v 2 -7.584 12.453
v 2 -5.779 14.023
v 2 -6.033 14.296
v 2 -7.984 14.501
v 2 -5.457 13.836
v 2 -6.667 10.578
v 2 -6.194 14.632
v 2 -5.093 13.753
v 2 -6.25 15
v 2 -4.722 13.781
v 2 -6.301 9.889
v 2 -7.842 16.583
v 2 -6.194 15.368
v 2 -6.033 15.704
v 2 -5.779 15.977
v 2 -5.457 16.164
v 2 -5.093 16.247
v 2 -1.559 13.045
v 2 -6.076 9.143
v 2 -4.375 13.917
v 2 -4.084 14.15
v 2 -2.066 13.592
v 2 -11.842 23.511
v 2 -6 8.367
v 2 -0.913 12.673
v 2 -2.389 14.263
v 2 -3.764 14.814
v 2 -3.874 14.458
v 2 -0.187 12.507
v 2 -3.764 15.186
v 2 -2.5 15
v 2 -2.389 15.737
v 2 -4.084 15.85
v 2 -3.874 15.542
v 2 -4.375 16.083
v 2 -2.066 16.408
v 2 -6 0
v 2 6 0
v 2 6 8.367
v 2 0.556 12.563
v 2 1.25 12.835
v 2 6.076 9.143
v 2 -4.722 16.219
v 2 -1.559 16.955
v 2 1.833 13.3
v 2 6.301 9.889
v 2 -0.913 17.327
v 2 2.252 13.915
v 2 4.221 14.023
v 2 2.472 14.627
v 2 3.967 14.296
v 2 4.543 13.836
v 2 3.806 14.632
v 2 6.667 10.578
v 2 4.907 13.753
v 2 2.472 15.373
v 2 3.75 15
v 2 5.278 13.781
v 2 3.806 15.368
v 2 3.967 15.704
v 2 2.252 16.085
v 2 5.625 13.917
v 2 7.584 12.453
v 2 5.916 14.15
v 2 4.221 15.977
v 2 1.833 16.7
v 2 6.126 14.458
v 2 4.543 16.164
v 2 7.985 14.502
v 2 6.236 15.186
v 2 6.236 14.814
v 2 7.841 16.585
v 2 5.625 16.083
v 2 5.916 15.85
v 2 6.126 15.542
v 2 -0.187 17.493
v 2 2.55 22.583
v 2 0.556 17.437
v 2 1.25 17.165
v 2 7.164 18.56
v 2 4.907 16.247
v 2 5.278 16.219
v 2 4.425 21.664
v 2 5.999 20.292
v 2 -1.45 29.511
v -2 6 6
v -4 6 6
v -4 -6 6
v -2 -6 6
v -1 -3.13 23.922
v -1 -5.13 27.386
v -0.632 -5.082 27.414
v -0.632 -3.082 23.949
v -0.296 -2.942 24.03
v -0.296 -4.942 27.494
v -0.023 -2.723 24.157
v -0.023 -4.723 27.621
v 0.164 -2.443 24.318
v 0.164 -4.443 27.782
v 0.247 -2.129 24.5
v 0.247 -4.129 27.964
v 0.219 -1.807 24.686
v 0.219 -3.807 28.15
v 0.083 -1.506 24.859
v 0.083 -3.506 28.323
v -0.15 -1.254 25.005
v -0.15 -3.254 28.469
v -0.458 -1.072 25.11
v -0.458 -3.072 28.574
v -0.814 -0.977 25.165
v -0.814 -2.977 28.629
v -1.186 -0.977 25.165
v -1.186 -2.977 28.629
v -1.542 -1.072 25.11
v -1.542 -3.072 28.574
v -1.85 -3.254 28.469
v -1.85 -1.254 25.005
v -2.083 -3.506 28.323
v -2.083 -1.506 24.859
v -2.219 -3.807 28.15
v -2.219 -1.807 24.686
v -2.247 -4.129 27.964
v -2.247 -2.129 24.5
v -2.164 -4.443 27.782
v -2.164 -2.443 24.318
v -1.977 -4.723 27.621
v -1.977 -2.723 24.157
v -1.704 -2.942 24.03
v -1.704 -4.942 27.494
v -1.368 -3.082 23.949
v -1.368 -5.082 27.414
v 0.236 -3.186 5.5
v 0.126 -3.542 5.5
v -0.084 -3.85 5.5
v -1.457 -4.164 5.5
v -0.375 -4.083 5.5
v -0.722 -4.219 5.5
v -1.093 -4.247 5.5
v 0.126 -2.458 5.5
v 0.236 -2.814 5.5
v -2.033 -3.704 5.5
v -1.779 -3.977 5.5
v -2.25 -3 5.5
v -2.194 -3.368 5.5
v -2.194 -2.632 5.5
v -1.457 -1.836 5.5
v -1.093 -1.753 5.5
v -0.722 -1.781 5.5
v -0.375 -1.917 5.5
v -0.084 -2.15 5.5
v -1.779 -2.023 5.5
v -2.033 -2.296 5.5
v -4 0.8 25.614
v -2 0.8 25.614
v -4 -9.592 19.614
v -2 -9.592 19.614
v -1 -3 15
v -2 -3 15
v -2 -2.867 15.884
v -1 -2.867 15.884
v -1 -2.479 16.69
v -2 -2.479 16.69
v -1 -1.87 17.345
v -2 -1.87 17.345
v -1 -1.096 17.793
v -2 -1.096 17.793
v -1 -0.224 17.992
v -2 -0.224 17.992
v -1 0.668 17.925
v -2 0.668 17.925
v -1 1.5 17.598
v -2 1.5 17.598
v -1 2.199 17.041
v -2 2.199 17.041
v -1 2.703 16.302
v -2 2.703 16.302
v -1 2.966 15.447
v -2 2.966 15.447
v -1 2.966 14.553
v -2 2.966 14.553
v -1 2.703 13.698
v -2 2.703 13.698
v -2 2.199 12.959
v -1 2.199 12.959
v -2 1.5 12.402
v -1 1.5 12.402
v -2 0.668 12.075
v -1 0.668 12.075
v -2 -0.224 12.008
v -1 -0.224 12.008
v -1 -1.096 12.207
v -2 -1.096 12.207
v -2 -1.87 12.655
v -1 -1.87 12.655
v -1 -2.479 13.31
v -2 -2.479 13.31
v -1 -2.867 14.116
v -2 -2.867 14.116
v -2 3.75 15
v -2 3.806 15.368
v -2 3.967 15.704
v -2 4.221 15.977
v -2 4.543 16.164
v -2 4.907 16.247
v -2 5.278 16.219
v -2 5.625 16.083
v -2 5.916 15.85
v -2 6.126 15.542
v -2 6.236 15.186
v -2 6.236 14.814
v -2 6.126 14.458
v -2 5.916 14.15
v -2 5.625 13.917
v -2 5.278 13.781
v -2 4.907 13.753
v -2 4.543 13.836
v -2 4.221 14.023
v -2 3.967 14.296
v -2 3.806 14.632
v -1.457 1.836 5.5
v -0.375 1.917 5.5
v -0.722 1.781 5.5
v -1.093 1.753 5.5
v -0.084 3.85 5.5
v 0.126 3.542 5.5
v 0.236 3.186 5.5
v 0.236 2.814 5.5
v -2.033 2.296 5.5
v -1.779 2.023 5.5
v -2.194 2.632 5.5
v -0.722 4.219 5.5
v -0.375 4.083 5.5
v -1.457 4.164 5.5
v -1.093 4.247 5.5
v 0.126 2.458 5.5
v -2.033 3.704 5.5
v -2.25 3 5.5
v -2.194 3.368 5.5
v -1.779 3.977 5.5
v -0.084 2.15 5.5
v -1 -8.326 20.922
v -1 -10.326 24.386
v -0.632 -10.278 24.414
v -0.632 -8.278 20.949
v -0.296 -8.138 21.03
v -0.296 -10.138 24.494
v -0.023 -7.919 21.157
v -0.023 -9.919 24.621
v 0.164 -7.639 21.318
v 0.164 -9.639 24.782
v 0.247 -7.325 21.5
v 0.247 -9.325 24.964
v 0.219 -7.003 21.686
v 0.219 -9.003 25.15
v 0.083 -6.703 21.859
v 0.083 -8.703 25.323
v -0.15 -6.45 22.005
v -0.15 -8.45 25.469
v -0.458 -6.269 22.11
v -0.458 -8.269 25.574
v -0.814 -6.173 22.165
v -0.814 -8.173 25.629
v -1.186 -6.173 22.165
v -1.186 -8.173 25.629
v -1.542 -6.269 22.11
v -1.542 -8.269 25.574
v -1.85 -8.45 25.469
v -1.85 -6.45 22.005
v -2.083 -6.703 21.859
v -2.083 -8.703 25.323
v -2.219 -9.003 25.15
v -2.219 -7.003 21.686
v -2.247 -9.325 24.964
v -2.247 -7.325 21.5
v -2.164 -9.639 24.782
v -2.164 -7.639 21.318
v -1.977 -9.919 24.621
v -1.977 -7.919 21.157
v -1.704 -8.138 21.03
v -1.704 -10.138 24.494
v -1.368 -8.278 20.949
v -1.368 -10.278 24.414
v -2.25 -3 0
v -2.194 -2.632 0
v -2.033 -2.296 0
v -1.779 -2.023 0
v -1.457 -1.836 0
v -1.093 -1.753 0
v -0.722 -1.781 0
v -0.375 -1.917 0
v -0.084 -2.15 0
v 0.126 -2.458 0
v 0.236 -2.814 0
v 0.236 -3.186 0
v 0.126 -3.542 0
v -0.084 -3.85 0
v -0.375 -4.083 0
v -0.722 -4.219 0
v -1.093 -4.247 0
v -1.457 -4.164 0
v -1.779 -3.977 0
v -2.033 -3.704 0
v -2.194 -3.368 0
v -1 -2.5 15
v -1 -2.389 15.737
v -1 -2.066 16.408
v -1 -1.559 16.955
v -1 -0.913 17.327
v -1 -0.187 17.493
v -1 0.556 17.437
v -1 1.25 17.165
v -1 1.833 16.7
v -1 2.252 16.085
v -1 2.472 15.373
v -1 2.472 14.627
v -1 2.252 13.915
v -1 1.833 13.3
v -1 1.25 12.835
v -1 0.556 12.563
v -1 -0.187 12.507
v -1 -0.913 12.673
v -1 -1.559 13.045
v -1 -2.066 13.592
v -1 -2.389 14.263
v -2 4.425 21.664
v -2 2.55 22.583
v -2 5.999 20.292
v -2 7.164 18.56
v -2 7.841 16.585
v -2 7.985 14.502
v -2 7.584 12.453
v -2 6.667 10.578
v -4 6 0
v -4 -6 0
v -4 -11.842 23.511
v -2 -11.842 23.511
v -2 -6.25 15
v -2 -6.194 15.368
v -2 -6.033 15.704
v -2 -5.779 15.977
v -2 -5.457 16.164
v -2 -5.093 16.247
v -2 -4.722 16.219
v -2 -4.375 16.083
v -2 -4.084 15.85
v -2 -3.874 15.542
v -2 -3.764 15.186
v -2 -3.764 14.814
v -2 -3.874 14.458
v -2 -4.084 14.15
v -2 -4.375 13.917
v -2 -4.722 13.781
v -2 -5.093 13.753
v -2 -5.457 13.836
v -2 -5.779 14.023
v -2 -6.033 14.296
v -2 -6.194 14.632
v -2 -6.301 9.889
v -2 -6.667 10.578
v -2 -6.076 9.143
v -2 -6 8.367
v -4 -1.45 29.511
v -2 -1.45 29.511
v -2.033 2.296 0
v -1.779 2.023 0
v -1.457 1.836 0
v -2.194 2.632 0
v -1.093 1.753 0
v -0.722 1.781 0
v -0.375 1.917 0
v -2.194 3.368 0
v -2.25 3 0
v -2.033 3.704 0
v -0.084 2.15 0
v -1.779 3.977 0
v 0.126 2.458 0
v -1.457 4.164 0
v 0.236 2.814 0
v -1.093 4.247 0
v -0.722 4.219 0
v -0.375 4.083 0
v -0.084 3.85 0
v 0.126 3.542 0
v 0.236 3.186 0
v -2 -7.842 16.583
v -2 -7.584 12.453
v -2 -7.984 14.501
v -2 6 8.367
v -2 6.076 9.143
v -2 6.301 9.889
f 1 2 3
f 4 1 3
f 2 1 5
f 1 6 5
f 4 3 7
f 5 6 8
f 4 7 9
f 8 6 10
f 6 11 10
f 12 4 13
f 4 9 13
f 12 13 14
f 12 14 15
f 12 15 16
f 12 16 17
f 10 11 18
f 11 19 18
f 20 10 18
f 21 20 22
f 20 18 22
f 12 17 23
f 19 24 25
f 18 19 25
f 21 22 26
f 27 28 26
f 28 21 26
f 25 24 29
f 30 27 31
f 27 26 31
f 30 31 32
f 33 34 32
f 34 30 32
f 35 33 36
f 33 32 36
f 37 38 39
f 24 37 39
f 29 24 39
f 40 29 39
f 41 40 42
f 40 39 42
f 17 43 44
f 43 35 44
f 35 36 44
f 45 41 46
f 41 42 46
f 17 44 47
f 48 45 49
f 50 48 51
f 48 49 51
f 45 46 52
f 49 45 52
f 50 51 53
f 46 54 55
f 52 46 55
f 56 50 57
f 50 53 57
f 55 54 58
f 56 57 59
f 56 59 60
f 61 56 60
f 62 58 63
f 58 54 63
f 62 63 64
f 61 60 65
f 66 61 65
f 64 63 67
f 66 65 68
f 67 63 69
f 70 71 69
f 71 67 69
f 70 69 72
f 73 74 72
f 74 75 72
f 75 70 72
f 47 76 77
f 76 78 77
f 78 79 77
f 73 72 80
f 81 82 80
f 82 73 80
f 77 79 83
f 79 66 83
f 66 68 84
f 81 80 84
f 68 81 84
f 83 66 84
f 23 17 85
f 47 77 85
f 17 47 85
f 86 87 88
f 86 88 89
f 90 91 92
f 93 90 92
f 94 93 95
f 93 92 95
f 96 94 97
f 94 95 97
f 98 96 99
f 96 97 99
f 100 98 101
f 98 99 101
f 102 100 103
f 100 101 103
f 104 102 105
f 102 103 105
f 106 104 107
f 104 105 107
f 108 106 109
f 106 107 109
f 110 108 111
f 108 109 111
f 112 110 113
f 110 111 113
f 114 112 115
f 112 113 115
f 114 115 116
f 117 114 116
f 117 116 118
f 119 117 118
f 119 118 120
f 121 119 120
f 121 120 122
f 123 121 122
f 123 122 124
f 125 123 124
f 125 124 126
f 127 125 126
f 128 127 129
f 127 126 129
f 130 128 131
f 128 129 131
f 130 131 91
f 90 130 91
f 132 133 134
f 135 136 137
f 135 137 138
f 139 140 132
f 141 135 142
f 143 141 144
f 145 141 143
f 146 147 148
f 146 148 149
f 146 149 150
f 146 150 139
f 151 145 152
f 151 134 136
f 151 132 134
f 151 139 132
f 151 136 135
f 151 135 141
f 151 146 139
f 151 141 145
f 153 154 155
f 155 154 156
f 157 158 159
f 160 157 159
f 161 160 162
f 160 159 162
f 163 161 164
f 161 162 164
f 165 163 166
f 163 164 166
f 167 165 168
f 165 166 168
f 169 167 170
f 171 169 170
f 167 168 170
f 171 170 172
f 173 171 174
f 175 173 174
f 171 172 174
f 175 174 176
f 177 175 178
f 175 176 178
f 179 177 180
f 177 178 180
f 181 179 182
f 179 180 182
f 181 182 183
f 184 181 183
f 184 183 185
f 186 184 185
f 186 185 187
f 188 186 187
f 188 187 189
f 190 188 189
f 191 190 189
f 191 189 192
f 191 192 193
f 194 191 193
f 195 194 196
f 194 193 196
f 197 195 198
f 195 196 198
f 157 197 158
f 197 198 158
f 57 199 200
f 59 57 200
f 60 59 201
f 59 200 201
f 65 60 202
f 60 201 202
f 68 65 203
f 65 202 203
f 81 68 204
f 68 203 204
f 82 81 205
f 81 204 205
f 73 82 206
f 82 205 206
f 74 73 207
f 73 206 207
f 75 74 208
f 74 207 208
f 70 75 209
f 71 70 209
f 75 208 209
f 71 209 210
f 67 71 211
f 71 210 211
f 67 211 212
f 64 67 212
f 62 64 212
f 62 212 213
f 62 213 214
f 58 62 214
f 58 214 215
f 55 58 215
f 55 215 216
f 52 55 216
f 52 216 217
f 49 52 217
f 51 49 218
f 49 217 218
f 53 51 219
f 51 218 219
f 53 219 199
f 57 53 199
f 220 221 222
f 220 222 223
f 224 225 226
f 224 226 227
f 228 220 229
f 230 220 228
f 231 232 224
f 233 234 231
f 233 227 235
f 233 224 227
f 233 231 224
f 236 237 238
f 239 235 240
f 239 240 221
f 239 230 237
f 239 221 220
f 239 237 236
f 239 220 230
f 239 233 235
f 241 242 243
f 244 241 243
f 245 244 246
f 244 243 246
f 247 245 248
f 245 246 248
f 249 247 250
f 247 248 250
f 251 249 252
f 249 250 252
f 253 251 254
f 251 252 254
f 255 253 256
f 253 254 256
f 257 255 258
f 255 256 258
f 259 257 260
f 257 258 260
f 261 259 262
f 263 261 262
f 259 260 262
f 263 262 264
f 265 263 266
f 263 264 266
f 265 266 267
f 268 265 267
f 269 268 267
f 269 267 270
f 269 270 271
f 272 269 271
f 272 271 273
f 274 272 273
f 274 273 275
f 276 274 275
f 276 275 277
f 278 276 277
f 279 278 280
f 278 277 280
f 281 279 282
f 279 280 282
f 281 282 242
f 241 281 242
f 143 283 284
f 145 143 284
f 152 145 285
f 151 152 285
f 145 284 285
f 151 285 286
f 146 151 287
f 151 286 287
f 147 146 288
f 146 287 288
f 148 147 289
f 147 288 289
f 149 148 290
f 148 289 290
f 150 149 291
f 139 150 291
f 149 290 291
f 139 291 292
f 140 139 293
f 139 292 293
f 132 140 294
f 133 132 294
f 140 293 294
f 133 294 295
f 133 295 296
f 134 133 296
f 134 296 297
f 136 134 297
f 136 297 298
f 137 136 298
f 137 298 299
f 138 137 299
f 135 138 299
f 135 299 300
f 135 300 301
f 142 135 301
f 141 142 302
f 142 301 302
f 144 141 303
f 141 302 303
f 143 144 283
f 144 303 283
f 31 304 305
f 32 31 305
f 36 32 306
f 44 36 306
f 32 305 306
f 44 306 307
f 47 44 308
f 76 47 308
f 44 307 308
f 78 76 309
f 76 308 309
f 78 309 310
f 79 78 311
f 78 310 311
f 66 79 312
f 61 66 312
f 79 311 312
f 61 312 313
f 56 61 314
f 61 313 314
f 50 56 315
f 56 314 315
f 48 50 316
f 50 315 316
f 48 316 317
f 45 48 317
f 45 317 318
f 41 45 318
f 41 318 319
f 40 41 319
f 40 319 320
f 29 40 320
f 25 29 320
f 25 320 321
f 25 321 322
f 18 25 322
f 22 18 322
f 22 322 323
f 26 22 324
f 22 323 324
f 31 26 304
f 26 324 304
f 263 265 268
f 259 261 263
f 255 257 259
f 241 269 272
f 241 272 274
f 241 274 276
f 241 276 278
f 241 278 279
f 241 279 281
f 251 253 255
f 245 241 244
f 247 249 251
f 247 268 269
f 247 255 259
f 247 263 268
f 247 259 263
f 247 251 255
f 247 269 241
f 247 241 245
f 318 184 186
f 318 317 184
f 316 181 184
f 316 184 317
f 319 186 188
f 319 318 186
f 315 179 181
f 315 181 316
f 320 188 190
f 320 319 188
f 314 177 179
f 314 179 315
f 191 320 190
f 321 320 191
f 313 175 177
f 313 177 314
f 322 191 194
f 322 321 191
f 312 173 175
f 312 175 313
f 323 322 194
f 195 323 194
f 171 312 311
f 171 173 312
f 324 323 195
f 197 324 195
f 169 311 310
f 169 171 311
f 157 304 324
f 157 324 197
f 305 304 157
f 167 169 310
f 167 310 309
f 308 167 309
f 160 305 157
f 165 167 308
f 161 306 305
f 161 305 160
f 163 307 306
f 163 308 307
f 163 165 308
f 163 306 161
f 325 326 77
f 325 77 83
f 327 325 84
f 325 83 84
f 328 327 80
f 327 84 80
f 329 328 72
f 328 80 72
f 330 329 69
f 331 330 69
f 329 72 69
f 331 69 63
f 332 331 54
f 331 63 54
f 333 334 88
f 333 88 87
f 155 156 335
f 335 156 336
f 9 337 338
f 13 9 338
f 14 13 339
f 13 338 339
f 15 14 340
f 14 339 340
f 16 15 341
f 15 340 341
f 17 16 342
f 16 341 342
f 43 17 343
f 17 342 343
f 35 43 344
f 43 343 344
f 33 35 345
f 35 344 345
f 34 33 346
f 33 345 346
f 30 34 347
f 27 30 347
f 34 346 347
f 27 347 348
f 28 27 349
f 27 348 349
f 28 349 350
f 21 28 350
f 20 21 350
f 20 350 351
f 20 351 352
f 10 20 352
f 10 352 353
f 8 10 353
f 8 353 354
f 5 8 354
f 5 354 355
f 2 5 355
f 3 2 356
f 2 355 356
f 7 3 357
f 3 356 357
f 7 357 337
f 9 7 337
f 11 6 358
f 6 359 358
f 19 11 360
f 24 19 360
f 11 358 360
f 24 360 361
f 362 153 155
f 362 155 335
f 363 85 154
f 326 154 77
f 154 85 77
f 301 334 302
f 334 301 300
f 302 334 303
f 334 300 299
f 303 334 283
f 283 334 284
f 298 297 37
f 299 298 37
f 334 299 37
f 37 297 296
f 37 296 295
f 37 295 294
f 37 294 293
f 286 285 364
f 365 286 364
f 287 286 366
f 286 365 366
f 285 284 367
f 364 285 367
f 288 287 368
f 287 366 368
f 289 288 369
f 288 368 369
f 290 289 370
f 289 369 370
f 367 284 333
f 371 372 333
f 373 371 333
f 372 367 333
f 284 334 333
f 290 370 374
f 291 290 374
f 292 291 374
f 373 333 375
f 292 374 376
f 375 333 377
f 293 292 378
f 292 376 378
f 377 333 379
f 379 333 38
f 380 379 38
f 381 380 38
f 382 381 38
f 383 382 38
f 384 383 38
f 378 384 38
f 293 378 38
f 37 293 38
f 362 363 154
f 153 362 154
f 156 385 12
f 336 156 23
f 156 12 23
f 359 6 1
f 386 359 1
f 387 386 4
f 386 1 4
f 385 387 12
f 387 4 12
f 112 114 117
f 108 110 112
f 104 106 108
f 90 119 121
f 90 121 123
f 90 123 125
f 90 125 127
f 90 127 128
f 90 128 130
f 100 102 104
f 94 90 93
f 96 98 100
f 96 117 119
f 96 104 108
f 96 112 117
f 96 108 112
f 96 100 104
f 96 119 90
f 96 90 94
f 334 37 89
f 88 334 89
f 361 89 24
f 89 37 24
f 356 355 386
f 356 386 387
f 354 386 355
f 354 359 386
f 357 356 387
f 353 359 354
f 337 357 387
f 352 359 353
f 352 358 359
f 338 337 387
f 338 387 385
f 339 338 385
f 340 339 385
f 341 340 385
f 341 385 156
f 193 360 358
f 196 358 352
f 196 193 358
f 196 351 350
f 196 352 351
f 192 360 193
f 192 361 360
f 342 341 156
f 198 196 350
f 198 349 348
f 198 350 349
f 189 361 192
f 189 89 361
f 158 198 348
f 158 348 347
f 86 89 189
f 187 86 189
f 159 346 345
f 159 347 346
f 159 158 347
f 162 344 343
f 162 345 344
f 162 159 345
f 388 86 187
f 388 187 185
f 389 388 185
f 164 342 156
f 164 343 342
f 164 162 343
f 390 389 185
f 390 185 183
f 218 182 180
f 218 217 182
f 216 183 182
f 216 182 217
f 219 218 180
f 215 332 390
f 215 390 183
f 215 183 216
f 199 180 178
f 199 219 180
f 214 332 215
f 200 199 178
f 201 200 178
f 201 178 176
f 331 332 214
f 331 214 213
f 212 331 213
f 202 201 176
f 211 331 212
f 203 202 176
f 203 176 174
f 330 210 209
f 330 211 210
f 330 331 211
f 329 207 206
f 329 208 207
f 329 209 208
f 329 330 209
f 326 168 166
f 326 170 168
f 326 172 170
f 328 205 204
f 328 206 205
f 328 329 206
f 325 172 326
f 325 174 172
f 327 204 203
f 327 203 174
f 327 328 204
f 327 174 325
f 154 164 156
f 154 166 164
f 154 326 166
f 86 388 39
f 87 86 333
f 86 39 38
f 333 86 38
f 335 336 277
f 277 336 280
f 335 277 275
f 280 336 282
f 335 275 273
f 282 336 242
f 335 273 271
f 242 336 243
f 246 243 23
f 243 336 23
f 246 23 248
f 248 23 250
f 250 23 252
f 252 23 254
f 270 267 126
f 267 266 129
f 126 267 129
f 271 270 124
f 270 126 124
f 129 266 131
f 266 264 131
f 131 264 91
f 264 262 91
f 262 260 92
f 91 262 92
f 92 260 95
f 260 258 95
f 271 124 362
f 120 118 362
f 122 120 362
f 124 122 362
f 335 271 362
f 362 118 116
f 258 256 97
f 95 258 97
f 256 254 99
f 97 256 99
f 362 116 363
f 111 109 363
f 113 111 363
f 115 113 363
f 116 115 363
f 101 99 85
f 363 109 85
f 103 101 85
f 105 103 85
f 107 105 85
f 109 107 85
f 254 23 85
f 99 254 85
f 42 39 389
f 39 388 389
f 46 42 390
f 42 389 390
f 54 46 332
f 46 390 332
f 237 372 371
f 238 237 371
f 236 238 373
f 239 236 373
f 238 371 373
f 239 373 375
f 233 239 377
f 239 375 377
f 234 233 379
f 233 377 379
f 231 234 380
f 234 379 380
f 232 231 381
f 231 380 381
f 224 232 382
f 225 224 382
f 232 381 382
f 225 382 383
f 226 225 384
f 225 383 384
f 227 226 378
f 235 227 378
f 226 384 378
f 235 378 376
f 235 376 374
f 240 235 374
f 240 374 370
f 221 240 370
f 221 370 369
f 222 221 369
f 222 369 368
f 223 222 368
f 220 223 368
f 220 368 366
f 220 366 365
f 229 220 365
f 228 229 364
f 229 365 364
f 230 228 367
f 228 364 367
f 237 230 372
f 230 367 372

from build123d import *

# Parameters (mm, degrees)
SKETCH1_W       = 6
SKETCH1_H       = 12
EXTRUDE1_DEPTH  = 6
SKETCH3_W       = 4
SKETCH3_H       = 8.6
EXTRUDE2_DEPTH  = 1
SKETCH2_R       = 1.25
EXTRUDE3_DEPTH  = 5.5
EXTRUDE4_DEPTH  = 4
SKETCH6_R       = 3
EXTRUDE5_DEPTH  = 1
SKETCH7_R       = 1.25
EXTRUDE6_DEPTH  = 4
SKETCH8_R       = 2.5
EXTRUDE7_DEPTH  = 3
FILLET1_R       = 4
EXTRUDE9_START  = -4
EXTRUDE9_DEPTH  = 4
EXTRUDE10_DEPTH = 2
SKETCH14_R      = 1.25
EXTRUDE11_DEPTH = 4


with BuildPart() as part:
    # Sketch1 → Extrude1 (new body)
    with BuildSketch(Plane.XY):
        with Locations((-1, 0)):
            Rectangle(SKETCH1_W, SKETCH1_H)
    extrude(amount=EXTRUDE1_DEPTH)

    # Sketch3 → Extrude2 (add)
    with BuildSketch(Plane.XY.offset(6)):
        Rectangle(SKETCH3_W, SKETCH3_H)
    extrude(amount=EXTRUDE2_DEPTH)

    # Sketch2 → Extrude3 (cut)
    with BuildSketch(Plane(origin=(0, 0, 0), x_dir=(-1, 0, 0), z_dir=(0, 0, -1))):
        with Locations((1, 3)):
            Circle(SKETCH2_R)
        with Locations((1, -3)):
            Circle(SKETCH2_R)
    extrude(amount=-EXTRUDE3_DEPTH, mode=Mode.SUBTRACT)

    # Sketch4 → Extrude4 (add)
    with BuildSketch(Plane(origin=(2, 0, 0), x_dir=(0, 0, -1), z_dir=(1, 0, 0))):
        with BuildLine():
            Line((-9.708497378, 6), (-6, 6))
            Line((-6, 6), (-6, -6))
            Line((-6, -6), (-9.708497378, -6))
            ThreePointArc((-9.708497378, -6), (-23, 0), (-9.708497378, 6))
        make_face()
    extrude(amount=-EXTRUDE4_DEPTH)

    # Sketch6 → Extrude5 (cut)
    with BuildSketch(Plane.ZY.offset(2)):
        with Locations(Location((15, 0, 0), (0, 0, 270))):
            Circle(SKETCH6_R)
    extrude(amount=-EXTRUDE5_DEPTH, mode=Mode.SUBTRACT)

    # Sketch7 → Extrude6 (cut)
    with BuildSketch(Plane.ZY.offset(2)):
        with Locations(Location((15, -5, 0), (0, 0, 270))):
            Circle(SKETCH7_R)
        with Locations(Location((15, 5, 0), (0, 0, 270))):
            Circle(SKETCH7_R)
    extrude(amount=-EXTRUDE6_DEPTH, mode=Mode.SUBTRACT)

    # Sketch8 → Extrude7 (cut)
    with BuildSketch(Plane.ZY.offset(1)):
        with Locations(Location((15, 0, 0), (0, 0, 270))):
            Circle(SKETCH8_R)
    extrude(amount=-EXTRUDE7_DEPTH, mode=Mode.SUBTRACT)

    # Fillet1
    fillet1_edges = [part.edges().sort_by_distance(p)[0] for p in [
        (0, -6, 9.708497378),
        (0, 6, 9.708497378),
    ]]
    fillet(fillet1_edges, radius=FILLET1_R)

    # Sketch12 → Extrude9 (add)
    with BuildSketch(Plane.ZY.offset(2).offset(EXTRUDE9_START)):
        with BuildLine():
            Line((16.582575695, -7.841903734), (23.510778925, -11.841903734))
            Line((23.510778925, -11.841903734), (29.510778925, -1.449598888))
            Line((29.510778925, -1.449598888), (22.582575695, 2.550401112))
            ThreePointArc((22.582575695, 2.550401112), (21.92820323, -4), (16.582575695, -7.841903734))
        make_face()
    extrude(amount=EXTRUDE9_DEPTH)

    # Sketch13 → Extrude10 (add)
    with BuildSketch(Plane.ZY.offset(2)):
        Polygon((29.510778925, -1.449598888), (25.613664608, 0.800401112), (19.613664608, -9.591903734), (23.510778925, -11.841903734), align=None)
    extrude(amount=EXTRUDE10_DEPTH)

    # Sketch14 → Extrude11 (cut)
    with BuildSketch(Plane(origin=(0, -13.140941839, 22.760778925), x_dir=(1, 0, 0), z_dir=(0, -0.5000000000000007, 0.8660254037844383))):
        with Locations(Location((-1, 4.5, 0), (0, 0, 270))):
            Circle(SKETCH14_R)
        with Locations(Location((-1, 10.5, 0), (0, 0, 270))):
            Circle(SKETCH14_R)
    extrude(amount=-EXTRUDE11_DEPTH, mode=Mode.SUBTRACT)


solid = part.part
